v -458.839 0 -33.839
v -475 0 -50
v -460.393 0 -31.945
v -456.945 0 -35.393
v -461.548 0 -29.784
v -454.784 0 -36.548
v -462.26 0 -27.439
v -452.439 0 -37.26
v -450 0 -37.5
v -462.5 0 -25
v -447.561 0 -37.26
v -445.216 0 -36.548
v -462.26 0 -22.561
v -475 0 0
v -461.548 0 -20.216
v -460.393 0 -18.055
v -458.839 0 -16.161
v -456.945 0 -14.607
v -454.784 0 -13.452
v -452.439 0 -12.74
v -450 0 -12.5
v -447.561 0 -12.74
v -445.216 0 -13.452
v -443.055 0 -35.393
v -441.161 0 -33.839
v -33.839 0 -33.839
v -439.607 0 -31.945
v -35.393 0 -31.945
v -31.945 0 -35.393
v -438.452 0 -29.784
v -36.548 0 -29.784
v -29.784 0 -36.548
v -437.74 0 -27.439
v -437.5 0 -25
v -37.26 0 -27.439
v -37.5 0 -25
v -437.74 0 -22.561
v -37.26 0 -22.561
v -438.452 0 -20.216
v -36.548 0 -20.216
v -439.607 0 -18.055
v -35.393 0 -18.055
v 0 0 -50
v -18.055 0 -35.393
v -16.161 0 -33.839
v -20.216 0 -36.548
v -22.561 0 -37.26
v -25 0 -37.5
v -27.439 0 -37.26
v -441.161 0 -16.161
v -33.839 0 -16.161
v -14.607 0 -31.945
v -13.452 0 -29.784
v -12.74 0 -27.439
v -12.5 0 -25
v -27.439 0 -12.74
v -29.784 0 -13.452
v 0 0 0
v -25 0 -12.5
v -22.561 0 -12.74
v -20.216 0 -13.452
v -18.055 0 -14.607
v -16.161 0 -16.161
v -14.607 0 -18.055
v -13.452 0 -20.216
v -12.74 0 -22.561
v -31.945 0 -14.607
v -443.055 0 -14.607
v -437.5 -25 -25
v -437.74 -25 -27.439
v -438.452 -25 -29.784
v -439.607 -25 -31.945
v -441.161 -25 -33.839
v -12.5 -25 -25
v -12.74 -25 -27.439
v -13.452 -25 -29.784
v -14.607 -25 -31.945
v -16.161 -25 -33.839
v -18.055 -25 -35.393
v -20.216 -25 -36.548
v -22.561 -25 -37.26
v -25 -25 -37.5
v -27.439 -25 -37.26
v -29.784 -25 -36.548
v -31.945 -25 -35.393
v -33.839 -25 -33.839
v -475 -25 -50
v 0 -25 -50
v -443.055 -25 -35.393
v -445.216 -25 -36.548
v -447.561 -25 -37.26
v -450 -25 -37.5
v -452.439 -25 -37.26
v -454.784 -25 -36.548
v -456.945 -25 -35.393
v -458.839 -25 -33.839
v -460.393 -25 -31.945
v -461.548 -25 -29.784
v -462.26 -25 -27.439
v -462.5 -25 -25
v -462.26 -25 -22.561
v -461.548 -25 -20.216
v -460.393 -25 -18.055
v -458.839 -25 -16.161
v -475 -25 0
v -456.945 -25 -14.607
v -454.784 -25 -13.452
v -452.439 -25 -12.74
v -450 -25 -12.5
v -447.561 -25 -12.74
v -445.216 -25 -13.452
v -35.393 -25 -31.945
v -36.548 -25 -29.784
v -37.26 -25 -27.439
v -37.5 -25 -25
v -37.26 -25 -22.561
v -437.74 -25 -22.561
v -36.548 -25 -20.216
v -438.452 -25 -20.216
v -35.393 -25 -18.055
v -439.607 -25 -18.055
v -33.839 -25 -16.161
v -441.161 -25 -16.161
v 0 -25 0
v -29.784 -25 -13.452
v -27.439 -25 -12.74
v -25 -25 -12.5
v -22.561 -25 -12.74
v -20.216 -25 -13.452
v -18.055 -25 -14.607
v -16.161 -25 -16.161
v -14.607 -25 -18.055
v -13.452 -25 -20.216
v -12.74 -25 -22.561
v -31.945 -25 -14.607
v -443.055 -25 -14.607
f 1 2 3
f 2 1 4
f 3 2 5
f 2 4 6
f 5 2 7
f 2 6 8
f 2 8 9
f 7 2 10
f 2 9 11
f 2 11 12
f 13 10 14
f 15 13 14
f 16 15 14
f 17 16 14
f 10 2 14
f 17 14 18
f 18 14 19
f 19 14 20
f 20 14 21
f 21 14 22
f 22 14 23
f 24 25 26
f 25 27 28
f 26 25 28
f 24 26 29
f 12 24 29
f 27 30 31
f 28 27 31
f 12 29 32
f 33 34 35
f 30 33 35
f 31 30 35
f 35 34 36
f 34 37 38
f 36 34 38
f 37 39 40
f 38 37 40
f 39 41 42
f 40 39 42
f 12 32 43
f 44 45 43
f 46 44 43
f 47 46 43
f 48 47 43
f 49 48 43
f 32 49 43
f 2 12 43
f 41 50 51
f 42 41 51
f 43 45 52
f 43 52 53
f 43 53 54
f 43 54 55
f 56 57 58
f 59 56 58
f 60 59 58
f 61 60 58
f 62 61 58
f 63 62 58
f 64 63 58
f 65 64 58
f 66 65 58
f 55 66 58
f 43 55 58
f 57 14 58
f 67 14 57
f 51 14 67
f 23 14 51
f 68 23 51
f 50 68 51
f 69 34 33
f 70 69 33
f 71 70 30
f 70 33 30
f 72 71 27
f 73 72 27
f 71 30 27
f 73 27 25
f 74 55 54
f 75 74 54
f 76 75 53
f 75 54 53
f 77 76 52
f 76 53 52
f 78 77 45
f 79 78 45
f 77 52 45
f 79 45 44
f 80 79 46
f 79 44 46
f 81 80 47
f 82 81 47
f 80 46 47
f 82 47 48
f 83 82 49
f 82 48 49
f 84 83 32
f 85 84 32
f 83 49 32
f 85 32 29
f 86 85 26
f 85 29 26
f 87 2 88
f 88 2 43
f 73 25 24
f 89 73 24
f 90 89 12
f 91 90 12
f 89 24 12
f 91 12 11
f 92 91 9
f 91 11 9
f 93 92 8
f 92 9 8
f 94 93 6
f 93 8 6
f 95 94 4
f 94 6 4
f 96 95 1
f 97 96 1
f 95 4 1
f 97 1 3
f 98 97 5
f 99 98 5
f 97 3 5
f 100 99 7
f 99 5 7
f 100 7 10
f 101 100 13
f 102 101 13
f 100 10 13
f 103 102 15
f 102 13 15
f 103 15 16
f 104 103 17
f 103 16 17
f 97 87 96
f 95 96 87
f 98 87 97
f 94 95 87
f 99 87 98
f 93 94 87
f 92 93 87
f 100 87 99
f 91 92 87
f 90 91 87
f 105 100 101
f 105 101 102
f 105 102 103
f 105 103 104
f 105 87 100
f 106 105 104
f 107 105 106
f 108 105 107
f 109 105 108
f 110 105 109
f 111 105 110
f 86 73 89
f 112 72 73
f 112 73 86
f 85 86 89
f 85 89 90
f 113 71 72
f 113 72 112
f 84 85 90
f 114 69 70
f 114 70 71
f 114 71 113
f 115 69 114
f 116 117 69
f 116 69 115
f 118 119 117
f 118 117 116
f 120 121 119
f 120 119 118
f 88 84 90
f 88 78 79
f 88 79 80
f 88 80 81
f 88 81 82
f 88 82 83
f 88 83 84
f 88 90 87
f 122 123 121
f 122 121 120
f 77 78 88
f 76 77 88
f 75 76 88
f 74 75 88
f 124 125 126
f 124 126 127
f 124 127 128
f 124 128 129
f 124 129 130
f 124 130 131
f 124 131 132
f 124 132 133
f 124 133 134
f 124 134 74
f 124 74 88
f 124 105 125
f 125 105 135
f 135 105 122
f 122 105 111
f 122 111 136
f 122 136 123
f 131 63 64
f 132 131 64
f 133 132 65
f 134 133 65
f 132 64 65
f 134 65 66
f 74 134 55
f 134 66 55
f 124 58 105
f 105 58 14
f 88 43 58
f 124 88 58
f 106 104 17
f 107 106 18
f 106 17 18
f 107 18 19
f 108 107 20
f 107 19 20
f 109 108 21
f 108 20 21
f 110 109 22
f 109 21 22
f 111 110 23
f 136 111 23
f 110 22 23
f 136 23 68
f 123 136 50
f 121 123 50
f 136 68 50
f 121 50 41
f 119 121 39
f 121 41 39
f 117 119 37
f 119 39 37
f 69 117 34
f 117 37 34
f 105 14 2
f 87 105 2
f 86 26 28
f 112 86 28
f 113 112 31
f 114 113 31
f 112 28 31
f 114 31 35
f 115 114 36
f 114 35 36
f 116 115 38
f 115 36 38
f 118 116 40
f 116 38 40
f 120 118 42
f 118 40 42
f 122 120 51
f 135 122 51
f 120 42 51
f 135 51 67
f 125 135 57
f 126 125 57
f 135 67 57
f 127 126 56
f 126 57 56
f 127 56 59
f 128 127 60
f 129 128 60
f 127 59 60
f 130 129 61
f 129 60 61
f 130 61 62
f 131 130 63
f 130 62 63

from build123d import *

# Parameters (mm, degrees)
F1_DEPTH = 25


with BuildPart() as f1:
    # F0 (on Front) → F1 (new body)
    with BuildSketch(Plane.XZ):
        with BuildLine():
            Line((-16.161165, -16.161165), (0, 0))
            Line((0, 0), (-475, 0))
            Line((-475, 0), (-458.838835, -16.161165))
            ThreePointArc((-458.838835, -16.161165), (-445.216457, -13.451506), (-437.5, -25))
            ThreePointArc((-437.5, -25), (-438.451506, -29.783543), (-441.161165, -33.838835))
            Line((-441.161165, -33.838835), (-425, -50))
            Line((-425, -50), (-50, -50))
            Line((-50, -50), (-33.838835, -33.838835))
            ThreePointArc((-33.838835, -33.838835), (-33.838835, -16.161165), (-16.161165, -16.161165))
        make_face()
        with BuildLine():
            Line((0, -50), (0, 0))
            Line((0, 0), (-16.161165, -16.161165))
            ThreePointArc((-16.161165, -16.161165), (-13.451506, -20.216457), (-12.5, -25))
            ThreePointArc((-12.5, -25), (-20.216457, -36.548494), (-33.838835, -33.838835))
            Line((-33.838835, -33.838835), (-50, -50))
            Line((-50, -50), (0, -50))
        make_face()
        with BuildLine():
            Line((-458.838835, -16.161165), (-475, 0))
            Line((-475, 0), (-475, -50))
            Line((-475, -50), (-425, -50))
            Line((-425, -50), (-441.161165, -33.838835))
            ThreePointArc((-441.161165, -33.838835), (-458.838835, -33.838835), (-458.838835, -16.161165))
        make_face()
    extrude(amount=F1_DEPTH)


solid = f1.part
